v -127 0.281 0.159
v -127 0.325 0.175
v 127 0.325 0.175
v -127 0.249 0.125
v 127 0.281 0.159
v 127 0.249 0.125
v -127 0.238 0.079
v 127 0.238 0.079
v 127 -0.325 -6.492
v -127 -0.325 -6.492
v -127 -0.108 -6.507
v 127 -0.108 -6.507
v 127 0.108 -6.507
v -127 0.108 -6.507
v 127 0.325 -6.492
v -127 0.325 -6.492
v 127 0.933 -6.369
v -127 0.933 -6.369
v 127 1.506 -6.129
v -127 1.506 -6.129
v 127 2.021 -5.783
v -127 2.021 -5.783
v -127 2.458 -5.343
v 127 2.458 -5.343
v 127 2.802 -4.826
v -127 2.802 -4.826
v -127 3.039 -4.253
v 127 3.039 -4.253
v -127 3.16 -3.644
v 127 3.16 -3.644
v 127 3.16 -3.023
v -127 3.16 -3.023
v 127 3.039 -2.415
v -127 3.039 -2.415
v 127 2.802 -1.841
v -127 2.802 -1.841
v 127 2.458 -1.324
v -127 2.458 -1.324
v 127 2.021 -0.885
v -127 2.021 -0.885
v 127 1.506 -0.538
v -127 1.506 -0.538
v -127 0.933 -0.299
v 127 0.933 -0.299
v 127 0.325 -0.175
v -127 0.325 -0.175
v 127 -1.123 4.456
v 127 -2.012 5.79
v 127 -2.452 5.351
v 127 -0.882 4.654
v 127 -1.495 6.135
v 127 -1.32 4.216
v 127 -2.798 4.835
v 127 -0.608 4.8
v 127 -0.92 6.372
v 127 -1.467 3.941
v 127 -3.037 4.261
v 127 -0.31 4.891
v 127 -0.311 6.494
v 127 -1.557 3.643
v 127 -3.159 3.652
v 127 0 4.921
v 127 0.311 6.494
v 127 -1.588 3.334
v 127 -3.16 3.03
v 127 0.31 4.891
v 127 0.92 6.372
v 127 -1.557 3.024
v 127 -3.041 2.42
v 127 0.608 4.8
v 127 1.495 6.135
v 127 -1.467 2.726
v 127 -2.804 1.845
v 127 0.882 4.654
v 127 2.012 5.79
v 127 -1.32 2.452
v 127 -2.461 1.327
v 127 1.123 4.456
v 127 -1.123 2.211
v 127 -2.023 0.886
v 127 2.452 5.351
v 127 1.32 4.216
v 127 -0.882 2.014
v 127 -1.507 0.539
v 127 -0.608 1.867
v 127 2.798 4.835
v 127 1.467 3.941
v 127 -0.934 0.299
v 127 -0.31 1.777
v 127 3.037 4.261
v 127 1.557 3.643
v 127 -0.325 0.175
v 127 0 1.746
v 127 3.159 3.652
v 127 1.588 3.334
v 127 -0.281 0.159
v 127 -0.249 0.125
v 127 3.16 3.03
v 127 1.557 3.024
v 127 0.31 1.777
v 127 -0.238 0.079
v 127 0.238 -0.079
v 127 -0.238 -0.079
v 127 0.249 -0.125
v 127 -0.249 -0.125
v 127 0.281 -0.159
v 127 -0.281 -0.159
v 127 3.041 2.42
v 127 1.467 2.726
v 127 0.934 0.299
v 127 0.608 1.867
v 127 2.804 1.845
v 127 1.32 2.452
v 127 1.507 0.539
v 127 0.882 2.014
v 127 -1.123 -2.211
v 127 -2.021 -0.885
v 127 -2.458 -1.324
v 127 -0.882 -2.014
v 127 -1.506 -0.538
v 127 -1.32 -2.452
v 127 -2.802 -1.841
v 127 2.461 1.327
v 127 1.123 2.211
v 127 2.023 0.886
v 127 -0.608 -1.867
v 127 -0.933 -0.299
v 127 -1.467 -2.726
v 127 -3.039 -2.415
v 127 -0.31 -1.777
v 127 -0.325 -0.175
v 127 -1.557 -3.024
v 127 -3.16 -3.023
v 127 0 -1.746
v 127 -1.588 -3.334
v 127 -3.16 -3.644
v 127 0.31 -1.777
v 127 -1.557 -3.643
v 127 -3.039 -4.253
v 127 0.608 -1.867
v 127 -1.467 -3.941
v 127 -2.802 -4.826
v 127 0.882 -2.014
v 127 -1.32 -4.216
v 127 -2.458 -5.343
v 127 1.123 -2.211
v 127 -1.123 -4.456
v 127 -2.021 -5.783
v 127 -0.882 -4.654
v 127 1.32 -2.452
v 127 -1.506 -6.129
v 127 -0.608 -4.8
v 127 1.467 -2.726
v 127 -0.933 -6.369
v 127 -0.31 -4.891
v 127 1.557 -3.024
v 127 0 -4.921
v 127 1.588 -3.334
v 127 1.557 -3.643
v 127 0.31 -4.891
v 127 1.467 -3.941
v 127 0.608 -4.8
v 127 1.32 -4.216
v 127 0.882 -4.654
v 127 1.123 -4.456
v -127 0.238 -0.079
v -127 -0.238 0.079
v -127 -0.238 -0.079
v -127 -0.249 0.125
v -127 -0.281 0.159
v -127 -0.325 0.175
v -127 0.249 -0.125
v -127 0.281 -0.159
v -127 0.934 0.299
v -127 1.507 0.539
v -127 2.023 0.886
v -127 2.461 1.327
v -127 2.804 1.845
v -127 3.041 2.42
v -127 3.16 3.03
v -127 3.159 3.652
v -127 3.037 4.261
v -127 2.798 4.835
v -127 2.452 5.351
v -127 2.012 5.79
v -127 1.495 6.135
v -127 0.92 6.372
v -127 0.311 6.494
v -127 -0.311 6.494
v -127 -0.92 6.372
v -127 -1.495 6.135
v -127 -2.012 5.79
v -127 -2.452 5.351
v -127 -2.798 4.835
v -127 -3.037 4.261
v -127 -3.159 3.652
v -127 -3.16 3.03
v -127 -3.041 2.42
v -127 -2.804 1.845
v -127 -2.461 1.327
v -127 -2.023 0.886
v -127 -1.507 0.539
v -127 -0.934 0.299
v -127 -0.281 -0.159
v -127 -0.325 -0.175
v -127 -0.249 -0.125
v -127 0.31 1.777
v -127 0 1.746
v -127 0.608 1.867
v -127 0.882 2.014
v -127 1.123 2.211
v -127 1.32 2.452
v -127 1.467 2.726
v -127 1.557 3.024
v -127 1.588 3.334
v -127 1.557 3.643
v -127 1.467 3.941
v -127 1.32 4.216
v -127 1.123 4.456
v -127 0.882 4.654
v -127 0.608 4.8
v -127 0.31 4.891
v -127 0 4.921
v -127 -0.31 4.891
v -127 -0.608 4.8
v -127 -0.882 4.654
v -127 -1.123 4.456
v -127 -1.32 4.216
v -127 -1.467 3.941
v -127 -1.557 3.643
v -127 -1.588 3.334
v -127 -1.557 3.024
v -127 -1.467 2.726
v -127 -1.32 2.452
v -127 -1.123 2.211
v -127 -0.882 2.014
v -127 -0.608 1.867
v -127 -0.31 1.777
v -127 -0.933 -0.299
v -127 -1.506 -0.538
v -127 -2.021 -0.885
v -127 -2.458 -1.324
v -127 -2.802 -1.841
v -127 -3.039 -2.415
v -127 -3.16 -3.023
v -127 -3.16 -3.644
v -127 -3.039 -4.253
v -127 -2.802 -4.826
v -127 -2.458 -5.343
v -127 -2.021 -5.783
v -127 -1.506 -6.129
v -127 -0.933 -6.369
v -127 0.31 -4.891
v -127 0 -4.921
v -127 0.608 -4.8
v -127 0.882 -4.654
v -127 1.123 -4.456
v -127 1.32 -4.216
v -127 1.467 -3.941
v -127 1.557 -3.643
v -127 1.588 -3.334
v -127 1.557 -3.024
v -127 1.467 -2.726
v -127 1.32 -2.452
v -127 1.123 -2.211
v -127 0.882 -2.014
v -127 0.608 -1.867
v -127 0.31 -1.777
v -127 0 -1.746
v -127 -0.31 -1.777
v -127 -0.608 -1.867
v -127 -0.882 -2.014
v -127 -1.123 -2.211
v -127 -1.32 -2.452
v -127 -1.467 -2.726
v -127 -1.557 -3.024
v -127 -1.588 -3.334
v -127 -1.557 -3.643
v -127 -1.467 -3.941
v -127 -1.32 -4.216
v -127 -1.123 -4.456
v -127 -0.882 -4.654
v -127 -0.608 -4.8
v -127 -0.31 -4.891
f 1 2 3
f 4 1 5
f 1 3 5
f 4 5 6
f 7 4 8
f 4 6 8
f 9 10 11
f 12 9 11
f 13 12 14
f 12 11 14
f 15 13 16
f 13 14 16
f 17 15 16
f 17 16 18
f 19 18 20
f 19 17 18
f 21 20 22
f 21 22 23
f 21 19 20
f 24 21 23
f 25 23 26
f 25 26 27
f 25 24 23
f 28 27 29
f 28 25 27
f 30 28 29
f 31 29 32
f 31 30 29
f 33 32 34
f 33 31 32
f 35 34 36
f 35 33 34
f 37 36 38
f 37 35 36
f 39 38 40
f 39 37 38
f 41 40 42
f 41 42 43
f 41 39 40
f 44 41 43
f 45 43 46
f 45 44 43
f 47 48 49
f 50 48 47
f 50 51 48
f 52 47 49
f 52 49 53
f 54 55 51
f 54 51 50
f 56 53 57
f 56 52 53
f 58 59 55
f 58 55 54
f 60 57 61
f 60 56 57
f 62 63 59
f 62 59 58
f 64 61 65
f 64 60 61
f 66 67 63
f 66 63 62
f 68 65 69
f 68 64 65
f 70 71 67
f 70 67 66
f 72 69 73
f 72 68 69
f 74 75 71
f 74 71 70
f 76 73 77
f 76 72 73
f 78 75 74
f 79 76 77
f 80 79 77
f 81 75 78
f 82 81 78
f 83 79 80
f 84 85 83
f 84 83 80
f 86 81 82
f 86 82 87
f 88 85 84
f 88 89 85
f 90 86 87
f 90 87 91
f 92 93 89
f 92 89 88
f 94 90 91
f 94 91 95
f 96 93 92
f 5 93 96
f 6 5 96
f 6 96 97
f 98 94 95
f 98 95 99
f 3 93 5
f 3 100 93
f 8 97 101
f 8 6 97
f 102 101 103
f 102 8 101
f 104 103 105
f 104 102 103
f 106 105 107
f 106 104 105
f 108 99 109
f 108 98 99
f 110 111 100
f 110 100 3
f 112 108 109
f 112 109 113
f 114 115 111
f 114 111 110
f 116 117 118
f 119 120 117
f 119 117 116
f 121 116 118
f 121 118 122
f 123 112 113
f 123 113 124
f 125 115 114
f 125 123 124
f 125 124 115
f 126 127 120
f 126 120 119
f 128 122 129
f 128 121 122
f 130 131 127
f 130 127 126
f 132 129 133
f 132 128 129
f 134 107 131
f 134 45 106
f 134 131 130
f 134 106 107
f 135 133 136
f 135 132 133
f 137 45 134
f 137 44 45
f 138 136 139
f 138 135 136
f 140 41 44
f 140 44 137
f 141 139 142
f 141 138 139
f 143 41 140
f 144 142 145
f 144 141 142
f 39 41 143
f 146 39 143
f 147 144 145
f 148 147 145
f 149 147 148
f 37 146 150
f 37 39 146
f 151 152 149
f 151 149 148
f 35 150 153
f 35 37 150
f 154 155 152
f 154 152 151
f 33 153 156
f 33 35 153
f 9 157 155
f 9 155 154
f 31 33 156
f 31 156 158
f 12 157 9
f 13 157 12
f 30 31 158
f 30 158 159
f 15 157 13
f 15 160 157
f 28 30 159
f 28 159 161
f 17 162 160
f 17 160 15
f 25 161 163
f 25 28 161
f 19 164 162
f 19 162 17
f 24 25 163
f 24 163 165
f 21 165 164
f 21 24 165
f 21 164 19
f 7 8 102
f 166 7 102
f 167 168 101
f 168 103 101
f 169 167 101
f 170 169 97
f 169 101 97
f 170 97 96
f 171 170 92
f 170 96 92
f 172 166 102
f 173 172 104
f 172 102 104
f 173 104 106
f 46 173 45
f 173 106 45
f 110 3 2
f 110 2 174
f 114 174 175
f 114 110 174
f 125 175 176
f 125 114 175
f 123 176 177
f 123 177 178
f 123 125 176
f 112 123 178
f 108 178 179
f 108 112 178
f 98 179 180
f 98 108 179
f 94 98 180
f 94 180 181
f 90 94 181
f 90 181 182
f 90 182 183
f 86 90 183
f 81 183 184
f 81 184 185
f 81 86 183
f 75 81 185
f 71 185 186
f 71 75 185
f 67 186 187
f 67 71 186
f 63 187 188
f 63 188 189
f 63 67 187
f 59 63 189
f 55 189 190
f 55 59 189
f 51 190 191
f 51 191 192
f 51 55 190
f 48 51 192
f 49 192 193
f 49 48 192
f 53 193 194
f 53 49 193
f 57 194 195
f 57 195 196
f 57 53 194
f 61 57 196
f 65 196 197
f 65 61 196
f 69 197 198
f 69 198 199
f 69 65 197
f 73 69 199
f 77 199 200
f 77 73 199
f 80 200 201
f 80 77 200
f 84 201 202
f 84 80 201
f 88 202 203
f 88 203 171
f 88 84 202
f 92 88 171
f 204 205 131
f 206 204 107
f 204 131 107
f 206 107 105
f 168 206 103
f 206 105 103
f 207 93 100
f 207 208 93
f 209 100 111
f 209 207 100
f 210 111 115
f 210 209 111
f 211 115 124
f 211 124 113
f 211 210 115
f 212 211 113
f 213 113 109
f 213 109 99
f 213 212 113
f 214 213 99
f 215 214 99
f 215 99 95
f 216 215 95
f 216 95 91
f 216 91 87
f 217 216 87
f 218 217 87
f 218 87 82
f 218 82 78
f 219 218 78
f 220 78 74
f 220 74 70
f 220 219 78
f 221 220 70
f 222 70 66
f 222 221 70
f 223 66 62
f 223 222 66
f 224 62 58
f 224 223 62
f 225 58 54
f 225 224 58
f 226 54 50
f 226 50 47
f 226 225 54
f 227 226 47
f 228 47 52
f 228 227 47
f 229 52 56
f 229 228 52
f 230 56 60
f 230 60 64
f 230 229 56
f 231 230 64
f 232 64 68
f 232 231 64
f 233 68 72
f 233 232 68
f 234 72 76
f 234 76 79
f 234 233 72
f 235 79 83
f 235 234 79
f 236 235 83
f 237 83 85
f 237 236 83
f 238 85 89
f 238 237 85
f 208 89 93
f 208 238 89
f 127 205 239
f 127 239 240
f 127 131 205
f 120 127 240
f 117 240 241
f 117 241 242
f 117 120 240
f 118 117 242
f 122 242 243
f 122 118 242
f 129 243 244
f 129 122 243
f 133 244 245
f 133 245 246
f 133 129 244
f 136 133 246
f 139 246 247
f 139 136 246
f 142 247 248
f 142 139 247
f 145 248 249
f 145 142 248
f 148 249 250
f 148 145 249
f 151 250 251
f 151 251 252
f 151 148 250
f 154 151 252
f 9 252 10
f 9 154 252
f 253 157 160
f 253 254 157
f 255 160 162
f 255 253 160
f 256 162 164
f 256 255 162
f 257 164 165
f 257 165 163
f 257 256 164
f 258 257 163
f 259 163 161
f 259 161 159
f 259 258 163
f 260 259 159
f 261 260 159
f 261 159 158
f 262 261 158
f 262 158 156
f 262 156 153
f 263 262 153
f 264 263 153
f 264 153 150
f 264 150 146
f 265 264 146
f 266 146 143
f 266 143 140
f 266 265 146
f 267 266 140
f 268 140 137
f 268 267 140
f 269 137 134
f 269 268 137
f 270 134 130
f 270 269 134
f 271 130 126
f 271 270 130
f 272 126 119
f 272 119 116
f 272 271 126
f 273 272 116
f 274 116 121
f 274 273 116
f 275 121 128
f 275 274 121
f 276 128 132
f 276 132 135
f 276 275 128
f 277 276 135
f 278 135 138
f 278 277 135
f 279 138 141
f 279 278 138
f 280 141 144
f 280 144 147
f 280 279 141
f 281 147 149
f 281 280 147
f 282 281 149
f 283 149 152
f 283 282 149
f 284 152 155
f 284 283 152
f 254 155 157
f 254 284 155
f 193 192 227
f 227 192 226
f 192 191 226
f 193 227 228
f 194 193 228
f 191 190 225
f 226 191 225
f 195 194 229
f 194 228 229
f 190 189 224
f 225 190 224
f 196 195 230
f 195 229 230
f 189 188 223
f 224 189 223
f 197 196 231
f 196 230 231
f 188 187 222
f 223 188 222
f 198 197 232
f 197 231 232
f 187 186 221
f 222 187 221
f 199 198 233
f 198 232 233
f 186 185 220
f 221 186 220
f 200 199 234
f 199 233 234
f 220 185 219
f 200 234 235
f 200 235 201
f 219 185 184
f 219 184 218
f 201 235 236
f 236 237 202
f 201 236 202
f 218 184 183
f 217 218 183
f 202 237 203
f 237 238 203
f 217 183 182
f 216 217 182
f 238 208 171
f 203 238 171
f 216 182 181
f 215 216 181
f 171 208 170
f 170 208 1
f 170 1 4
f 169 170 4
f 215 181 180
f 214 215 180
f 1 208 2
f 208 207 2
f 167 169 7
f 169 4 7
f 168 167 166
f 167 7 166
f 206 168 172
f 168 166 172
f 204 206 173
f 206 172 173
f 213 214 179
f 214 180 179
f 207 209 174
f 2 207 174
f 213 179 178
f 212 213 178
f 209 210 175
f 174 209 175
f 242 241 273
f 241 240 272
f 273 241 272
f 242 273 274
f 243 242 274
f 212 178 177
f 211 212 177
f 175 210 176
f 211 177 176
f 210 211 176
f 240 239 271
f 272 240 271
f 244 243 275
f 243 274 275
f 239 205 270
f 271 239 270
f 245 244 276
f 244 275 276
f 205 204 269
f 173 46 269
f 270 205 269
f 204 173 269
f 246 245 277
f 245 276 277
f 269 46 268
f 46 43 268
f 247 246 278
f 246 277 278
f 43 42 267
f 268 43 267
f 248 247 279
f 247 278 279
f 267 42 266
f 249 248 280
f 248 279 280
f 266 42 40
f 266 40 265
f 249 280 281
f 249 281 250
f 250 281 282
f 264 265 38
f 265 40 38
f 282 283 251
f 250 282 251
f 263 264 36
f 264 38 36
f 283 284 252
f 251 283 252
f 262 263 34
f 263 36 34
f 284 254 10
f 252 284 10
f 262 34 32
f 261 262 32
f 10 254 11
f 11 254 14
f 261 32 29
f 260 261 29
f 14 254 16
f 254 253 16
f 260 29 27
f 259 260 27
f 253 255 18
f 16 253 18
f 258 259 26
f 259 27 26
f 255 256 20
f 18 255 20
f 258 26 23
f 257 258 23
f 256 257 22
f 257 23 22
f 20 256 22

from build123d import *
from build123d.topology import SkipClean

# Parameters (mm, degrees)
SKETCH3_R               = 3.175
SKETCH3_R_2             = 1.5875
BOSS_EXTRUDE1_DEPTH     = 127
LPATTERN1_COUNT         = 2
LPATTERN1_PITCH         = 6.6675
BOSS_EXTRUDE2_DEPTH     = 127
CUT_EXTRUDE1_DEPTH      = 128.223842042
CUT_EXTRUDE1_DEPTH_BACK = 128.223842042


with BuildPart() as part:
    # Sketch3 → Boss-Extrude1 (new, symmetric)
    with BuildSketch(Plane(origin=(0, 0, 0), x_dir=(0, 0, -1), z_dir=(1, 0, 0))):
        with Locations((3.33375, 0)):
            Circle(SKETCH3_R)
        with Locations((3.33375, 0)):
            Circle(SKETCH3_R_2, mode=Mode.SUBTRACT)
    extrude(amount=BOSS_EXTRUDE1_DEPTH, both=True)


with BuildPart() as lpattern1_1:
    # LPattern1: pattern copy
    add(part.part.moved(Location(Vector(0, 0, 1) * (1 * LPATTERN1_PITCH))))


with BuildPart() as part_1:
    add(part.part)

    add(lpattern1_1.part)  # Boss-Extrude2 merges LPattern1_1
    # Sketch4 → Boss-Extrude2 (add, symmetric)
    with BuildSketch(Plane(origin=(0, 0, 0), x_dir=(0, 0, -1), z_dir=(1, 0, 0))):
        with BuildLine():
            Line((6.588125, 0.238125), (6.746875, 0.238125))
            ThreePointArc((6.746875, 0.238125), (6.811551474, 0.262993637), (6.842905738, 0.324786885))
            Line((6.842905738, 0.324786885), (6.842905738, -0.324786885))
            ThreePointArc((6.842905738, -0.324786885), (6.811551474, -0.262993637), (6.746875, -0.238125))
            Line((6.746875, -0.238125), (6.588125, -0.238125))
            ThreePointArc((6.588125, -0.238125), (6.523448526, -0.262993637), (6.492094262, -0.324786885))
            Line((6.492094262, -0.324786885), (6.492094262, 0.324786885))
            ThreePointArc((6.492094262, 0.324786885), (6.523448526, 0.262993637), (6.588125, 0.238125))
        make_face()
        with BuildLine():
            Line((0.175405738, 0.324786885), (0.175405738, -0.324786885))
            ThreePointArc((0.175405738, -0.324786885), (0.144051474, -0.262993637), (0.079375, -0.238125))
            Line((0.079375, -0.238125), (-0.079375, -0.238125))
            ThreePointArc((-0.079375, -0.238125), (-0.144051474, -0.262993637), (-0.175405738, -0.324786885))
            Line((-0.175405738, -0.324786885), (-0.175405738, 0.324786885))
            ThreePointArc((-0.175405738, 0.324786885), (-0.144051474, 0.262993637), (-0.079375, 0.238125))
            Line((-0.079375, 0.238125), (0.079375, 0.238125))
            ThreePointArc((0.079375, 0.238125), (0.144051474, 0.262993637), (0.175405738, 0.324786885))
        make_face()
    extrude(amount=BOSS_EXTRUDE2_DEPTH, both=True)

    # Sketch5 → Cut-Extrude1 (cut, two sides: drawn at the far end of the back side and taken through both)
    with SkipClean():  # the faces are left unmerged after this step: merging them gives an invalid solid
        with BuildSketch(Plane(origin=(0, 0, 0), x_dir=(0, 0, -1), z_dir=(1, 0, 0)).offset(-CUT_EXTRUDE1_DEPTH_BACK)):
            with BuildLine():
                Line((6.492094262, 0.324786885), (6.842905738, 0.324786885))
                Line((6.842905738, 0.324786885), (6.842905738, -0.324786885))
                Line((6.842905738, -0.324786885), (6.492094262, -0.324786885))
                ThreePointArc((6.492094262, -0.324786885), (6.50875, 0), (6.492094262, 0.324786885))
            make_face()
        extrude(amount=CUT_EXTRUDE1_DEPTH + CUT_EXTRUDE1_DEPTH_BACK, mode=Mode.SUBTRACT)


solid = part_1.part
